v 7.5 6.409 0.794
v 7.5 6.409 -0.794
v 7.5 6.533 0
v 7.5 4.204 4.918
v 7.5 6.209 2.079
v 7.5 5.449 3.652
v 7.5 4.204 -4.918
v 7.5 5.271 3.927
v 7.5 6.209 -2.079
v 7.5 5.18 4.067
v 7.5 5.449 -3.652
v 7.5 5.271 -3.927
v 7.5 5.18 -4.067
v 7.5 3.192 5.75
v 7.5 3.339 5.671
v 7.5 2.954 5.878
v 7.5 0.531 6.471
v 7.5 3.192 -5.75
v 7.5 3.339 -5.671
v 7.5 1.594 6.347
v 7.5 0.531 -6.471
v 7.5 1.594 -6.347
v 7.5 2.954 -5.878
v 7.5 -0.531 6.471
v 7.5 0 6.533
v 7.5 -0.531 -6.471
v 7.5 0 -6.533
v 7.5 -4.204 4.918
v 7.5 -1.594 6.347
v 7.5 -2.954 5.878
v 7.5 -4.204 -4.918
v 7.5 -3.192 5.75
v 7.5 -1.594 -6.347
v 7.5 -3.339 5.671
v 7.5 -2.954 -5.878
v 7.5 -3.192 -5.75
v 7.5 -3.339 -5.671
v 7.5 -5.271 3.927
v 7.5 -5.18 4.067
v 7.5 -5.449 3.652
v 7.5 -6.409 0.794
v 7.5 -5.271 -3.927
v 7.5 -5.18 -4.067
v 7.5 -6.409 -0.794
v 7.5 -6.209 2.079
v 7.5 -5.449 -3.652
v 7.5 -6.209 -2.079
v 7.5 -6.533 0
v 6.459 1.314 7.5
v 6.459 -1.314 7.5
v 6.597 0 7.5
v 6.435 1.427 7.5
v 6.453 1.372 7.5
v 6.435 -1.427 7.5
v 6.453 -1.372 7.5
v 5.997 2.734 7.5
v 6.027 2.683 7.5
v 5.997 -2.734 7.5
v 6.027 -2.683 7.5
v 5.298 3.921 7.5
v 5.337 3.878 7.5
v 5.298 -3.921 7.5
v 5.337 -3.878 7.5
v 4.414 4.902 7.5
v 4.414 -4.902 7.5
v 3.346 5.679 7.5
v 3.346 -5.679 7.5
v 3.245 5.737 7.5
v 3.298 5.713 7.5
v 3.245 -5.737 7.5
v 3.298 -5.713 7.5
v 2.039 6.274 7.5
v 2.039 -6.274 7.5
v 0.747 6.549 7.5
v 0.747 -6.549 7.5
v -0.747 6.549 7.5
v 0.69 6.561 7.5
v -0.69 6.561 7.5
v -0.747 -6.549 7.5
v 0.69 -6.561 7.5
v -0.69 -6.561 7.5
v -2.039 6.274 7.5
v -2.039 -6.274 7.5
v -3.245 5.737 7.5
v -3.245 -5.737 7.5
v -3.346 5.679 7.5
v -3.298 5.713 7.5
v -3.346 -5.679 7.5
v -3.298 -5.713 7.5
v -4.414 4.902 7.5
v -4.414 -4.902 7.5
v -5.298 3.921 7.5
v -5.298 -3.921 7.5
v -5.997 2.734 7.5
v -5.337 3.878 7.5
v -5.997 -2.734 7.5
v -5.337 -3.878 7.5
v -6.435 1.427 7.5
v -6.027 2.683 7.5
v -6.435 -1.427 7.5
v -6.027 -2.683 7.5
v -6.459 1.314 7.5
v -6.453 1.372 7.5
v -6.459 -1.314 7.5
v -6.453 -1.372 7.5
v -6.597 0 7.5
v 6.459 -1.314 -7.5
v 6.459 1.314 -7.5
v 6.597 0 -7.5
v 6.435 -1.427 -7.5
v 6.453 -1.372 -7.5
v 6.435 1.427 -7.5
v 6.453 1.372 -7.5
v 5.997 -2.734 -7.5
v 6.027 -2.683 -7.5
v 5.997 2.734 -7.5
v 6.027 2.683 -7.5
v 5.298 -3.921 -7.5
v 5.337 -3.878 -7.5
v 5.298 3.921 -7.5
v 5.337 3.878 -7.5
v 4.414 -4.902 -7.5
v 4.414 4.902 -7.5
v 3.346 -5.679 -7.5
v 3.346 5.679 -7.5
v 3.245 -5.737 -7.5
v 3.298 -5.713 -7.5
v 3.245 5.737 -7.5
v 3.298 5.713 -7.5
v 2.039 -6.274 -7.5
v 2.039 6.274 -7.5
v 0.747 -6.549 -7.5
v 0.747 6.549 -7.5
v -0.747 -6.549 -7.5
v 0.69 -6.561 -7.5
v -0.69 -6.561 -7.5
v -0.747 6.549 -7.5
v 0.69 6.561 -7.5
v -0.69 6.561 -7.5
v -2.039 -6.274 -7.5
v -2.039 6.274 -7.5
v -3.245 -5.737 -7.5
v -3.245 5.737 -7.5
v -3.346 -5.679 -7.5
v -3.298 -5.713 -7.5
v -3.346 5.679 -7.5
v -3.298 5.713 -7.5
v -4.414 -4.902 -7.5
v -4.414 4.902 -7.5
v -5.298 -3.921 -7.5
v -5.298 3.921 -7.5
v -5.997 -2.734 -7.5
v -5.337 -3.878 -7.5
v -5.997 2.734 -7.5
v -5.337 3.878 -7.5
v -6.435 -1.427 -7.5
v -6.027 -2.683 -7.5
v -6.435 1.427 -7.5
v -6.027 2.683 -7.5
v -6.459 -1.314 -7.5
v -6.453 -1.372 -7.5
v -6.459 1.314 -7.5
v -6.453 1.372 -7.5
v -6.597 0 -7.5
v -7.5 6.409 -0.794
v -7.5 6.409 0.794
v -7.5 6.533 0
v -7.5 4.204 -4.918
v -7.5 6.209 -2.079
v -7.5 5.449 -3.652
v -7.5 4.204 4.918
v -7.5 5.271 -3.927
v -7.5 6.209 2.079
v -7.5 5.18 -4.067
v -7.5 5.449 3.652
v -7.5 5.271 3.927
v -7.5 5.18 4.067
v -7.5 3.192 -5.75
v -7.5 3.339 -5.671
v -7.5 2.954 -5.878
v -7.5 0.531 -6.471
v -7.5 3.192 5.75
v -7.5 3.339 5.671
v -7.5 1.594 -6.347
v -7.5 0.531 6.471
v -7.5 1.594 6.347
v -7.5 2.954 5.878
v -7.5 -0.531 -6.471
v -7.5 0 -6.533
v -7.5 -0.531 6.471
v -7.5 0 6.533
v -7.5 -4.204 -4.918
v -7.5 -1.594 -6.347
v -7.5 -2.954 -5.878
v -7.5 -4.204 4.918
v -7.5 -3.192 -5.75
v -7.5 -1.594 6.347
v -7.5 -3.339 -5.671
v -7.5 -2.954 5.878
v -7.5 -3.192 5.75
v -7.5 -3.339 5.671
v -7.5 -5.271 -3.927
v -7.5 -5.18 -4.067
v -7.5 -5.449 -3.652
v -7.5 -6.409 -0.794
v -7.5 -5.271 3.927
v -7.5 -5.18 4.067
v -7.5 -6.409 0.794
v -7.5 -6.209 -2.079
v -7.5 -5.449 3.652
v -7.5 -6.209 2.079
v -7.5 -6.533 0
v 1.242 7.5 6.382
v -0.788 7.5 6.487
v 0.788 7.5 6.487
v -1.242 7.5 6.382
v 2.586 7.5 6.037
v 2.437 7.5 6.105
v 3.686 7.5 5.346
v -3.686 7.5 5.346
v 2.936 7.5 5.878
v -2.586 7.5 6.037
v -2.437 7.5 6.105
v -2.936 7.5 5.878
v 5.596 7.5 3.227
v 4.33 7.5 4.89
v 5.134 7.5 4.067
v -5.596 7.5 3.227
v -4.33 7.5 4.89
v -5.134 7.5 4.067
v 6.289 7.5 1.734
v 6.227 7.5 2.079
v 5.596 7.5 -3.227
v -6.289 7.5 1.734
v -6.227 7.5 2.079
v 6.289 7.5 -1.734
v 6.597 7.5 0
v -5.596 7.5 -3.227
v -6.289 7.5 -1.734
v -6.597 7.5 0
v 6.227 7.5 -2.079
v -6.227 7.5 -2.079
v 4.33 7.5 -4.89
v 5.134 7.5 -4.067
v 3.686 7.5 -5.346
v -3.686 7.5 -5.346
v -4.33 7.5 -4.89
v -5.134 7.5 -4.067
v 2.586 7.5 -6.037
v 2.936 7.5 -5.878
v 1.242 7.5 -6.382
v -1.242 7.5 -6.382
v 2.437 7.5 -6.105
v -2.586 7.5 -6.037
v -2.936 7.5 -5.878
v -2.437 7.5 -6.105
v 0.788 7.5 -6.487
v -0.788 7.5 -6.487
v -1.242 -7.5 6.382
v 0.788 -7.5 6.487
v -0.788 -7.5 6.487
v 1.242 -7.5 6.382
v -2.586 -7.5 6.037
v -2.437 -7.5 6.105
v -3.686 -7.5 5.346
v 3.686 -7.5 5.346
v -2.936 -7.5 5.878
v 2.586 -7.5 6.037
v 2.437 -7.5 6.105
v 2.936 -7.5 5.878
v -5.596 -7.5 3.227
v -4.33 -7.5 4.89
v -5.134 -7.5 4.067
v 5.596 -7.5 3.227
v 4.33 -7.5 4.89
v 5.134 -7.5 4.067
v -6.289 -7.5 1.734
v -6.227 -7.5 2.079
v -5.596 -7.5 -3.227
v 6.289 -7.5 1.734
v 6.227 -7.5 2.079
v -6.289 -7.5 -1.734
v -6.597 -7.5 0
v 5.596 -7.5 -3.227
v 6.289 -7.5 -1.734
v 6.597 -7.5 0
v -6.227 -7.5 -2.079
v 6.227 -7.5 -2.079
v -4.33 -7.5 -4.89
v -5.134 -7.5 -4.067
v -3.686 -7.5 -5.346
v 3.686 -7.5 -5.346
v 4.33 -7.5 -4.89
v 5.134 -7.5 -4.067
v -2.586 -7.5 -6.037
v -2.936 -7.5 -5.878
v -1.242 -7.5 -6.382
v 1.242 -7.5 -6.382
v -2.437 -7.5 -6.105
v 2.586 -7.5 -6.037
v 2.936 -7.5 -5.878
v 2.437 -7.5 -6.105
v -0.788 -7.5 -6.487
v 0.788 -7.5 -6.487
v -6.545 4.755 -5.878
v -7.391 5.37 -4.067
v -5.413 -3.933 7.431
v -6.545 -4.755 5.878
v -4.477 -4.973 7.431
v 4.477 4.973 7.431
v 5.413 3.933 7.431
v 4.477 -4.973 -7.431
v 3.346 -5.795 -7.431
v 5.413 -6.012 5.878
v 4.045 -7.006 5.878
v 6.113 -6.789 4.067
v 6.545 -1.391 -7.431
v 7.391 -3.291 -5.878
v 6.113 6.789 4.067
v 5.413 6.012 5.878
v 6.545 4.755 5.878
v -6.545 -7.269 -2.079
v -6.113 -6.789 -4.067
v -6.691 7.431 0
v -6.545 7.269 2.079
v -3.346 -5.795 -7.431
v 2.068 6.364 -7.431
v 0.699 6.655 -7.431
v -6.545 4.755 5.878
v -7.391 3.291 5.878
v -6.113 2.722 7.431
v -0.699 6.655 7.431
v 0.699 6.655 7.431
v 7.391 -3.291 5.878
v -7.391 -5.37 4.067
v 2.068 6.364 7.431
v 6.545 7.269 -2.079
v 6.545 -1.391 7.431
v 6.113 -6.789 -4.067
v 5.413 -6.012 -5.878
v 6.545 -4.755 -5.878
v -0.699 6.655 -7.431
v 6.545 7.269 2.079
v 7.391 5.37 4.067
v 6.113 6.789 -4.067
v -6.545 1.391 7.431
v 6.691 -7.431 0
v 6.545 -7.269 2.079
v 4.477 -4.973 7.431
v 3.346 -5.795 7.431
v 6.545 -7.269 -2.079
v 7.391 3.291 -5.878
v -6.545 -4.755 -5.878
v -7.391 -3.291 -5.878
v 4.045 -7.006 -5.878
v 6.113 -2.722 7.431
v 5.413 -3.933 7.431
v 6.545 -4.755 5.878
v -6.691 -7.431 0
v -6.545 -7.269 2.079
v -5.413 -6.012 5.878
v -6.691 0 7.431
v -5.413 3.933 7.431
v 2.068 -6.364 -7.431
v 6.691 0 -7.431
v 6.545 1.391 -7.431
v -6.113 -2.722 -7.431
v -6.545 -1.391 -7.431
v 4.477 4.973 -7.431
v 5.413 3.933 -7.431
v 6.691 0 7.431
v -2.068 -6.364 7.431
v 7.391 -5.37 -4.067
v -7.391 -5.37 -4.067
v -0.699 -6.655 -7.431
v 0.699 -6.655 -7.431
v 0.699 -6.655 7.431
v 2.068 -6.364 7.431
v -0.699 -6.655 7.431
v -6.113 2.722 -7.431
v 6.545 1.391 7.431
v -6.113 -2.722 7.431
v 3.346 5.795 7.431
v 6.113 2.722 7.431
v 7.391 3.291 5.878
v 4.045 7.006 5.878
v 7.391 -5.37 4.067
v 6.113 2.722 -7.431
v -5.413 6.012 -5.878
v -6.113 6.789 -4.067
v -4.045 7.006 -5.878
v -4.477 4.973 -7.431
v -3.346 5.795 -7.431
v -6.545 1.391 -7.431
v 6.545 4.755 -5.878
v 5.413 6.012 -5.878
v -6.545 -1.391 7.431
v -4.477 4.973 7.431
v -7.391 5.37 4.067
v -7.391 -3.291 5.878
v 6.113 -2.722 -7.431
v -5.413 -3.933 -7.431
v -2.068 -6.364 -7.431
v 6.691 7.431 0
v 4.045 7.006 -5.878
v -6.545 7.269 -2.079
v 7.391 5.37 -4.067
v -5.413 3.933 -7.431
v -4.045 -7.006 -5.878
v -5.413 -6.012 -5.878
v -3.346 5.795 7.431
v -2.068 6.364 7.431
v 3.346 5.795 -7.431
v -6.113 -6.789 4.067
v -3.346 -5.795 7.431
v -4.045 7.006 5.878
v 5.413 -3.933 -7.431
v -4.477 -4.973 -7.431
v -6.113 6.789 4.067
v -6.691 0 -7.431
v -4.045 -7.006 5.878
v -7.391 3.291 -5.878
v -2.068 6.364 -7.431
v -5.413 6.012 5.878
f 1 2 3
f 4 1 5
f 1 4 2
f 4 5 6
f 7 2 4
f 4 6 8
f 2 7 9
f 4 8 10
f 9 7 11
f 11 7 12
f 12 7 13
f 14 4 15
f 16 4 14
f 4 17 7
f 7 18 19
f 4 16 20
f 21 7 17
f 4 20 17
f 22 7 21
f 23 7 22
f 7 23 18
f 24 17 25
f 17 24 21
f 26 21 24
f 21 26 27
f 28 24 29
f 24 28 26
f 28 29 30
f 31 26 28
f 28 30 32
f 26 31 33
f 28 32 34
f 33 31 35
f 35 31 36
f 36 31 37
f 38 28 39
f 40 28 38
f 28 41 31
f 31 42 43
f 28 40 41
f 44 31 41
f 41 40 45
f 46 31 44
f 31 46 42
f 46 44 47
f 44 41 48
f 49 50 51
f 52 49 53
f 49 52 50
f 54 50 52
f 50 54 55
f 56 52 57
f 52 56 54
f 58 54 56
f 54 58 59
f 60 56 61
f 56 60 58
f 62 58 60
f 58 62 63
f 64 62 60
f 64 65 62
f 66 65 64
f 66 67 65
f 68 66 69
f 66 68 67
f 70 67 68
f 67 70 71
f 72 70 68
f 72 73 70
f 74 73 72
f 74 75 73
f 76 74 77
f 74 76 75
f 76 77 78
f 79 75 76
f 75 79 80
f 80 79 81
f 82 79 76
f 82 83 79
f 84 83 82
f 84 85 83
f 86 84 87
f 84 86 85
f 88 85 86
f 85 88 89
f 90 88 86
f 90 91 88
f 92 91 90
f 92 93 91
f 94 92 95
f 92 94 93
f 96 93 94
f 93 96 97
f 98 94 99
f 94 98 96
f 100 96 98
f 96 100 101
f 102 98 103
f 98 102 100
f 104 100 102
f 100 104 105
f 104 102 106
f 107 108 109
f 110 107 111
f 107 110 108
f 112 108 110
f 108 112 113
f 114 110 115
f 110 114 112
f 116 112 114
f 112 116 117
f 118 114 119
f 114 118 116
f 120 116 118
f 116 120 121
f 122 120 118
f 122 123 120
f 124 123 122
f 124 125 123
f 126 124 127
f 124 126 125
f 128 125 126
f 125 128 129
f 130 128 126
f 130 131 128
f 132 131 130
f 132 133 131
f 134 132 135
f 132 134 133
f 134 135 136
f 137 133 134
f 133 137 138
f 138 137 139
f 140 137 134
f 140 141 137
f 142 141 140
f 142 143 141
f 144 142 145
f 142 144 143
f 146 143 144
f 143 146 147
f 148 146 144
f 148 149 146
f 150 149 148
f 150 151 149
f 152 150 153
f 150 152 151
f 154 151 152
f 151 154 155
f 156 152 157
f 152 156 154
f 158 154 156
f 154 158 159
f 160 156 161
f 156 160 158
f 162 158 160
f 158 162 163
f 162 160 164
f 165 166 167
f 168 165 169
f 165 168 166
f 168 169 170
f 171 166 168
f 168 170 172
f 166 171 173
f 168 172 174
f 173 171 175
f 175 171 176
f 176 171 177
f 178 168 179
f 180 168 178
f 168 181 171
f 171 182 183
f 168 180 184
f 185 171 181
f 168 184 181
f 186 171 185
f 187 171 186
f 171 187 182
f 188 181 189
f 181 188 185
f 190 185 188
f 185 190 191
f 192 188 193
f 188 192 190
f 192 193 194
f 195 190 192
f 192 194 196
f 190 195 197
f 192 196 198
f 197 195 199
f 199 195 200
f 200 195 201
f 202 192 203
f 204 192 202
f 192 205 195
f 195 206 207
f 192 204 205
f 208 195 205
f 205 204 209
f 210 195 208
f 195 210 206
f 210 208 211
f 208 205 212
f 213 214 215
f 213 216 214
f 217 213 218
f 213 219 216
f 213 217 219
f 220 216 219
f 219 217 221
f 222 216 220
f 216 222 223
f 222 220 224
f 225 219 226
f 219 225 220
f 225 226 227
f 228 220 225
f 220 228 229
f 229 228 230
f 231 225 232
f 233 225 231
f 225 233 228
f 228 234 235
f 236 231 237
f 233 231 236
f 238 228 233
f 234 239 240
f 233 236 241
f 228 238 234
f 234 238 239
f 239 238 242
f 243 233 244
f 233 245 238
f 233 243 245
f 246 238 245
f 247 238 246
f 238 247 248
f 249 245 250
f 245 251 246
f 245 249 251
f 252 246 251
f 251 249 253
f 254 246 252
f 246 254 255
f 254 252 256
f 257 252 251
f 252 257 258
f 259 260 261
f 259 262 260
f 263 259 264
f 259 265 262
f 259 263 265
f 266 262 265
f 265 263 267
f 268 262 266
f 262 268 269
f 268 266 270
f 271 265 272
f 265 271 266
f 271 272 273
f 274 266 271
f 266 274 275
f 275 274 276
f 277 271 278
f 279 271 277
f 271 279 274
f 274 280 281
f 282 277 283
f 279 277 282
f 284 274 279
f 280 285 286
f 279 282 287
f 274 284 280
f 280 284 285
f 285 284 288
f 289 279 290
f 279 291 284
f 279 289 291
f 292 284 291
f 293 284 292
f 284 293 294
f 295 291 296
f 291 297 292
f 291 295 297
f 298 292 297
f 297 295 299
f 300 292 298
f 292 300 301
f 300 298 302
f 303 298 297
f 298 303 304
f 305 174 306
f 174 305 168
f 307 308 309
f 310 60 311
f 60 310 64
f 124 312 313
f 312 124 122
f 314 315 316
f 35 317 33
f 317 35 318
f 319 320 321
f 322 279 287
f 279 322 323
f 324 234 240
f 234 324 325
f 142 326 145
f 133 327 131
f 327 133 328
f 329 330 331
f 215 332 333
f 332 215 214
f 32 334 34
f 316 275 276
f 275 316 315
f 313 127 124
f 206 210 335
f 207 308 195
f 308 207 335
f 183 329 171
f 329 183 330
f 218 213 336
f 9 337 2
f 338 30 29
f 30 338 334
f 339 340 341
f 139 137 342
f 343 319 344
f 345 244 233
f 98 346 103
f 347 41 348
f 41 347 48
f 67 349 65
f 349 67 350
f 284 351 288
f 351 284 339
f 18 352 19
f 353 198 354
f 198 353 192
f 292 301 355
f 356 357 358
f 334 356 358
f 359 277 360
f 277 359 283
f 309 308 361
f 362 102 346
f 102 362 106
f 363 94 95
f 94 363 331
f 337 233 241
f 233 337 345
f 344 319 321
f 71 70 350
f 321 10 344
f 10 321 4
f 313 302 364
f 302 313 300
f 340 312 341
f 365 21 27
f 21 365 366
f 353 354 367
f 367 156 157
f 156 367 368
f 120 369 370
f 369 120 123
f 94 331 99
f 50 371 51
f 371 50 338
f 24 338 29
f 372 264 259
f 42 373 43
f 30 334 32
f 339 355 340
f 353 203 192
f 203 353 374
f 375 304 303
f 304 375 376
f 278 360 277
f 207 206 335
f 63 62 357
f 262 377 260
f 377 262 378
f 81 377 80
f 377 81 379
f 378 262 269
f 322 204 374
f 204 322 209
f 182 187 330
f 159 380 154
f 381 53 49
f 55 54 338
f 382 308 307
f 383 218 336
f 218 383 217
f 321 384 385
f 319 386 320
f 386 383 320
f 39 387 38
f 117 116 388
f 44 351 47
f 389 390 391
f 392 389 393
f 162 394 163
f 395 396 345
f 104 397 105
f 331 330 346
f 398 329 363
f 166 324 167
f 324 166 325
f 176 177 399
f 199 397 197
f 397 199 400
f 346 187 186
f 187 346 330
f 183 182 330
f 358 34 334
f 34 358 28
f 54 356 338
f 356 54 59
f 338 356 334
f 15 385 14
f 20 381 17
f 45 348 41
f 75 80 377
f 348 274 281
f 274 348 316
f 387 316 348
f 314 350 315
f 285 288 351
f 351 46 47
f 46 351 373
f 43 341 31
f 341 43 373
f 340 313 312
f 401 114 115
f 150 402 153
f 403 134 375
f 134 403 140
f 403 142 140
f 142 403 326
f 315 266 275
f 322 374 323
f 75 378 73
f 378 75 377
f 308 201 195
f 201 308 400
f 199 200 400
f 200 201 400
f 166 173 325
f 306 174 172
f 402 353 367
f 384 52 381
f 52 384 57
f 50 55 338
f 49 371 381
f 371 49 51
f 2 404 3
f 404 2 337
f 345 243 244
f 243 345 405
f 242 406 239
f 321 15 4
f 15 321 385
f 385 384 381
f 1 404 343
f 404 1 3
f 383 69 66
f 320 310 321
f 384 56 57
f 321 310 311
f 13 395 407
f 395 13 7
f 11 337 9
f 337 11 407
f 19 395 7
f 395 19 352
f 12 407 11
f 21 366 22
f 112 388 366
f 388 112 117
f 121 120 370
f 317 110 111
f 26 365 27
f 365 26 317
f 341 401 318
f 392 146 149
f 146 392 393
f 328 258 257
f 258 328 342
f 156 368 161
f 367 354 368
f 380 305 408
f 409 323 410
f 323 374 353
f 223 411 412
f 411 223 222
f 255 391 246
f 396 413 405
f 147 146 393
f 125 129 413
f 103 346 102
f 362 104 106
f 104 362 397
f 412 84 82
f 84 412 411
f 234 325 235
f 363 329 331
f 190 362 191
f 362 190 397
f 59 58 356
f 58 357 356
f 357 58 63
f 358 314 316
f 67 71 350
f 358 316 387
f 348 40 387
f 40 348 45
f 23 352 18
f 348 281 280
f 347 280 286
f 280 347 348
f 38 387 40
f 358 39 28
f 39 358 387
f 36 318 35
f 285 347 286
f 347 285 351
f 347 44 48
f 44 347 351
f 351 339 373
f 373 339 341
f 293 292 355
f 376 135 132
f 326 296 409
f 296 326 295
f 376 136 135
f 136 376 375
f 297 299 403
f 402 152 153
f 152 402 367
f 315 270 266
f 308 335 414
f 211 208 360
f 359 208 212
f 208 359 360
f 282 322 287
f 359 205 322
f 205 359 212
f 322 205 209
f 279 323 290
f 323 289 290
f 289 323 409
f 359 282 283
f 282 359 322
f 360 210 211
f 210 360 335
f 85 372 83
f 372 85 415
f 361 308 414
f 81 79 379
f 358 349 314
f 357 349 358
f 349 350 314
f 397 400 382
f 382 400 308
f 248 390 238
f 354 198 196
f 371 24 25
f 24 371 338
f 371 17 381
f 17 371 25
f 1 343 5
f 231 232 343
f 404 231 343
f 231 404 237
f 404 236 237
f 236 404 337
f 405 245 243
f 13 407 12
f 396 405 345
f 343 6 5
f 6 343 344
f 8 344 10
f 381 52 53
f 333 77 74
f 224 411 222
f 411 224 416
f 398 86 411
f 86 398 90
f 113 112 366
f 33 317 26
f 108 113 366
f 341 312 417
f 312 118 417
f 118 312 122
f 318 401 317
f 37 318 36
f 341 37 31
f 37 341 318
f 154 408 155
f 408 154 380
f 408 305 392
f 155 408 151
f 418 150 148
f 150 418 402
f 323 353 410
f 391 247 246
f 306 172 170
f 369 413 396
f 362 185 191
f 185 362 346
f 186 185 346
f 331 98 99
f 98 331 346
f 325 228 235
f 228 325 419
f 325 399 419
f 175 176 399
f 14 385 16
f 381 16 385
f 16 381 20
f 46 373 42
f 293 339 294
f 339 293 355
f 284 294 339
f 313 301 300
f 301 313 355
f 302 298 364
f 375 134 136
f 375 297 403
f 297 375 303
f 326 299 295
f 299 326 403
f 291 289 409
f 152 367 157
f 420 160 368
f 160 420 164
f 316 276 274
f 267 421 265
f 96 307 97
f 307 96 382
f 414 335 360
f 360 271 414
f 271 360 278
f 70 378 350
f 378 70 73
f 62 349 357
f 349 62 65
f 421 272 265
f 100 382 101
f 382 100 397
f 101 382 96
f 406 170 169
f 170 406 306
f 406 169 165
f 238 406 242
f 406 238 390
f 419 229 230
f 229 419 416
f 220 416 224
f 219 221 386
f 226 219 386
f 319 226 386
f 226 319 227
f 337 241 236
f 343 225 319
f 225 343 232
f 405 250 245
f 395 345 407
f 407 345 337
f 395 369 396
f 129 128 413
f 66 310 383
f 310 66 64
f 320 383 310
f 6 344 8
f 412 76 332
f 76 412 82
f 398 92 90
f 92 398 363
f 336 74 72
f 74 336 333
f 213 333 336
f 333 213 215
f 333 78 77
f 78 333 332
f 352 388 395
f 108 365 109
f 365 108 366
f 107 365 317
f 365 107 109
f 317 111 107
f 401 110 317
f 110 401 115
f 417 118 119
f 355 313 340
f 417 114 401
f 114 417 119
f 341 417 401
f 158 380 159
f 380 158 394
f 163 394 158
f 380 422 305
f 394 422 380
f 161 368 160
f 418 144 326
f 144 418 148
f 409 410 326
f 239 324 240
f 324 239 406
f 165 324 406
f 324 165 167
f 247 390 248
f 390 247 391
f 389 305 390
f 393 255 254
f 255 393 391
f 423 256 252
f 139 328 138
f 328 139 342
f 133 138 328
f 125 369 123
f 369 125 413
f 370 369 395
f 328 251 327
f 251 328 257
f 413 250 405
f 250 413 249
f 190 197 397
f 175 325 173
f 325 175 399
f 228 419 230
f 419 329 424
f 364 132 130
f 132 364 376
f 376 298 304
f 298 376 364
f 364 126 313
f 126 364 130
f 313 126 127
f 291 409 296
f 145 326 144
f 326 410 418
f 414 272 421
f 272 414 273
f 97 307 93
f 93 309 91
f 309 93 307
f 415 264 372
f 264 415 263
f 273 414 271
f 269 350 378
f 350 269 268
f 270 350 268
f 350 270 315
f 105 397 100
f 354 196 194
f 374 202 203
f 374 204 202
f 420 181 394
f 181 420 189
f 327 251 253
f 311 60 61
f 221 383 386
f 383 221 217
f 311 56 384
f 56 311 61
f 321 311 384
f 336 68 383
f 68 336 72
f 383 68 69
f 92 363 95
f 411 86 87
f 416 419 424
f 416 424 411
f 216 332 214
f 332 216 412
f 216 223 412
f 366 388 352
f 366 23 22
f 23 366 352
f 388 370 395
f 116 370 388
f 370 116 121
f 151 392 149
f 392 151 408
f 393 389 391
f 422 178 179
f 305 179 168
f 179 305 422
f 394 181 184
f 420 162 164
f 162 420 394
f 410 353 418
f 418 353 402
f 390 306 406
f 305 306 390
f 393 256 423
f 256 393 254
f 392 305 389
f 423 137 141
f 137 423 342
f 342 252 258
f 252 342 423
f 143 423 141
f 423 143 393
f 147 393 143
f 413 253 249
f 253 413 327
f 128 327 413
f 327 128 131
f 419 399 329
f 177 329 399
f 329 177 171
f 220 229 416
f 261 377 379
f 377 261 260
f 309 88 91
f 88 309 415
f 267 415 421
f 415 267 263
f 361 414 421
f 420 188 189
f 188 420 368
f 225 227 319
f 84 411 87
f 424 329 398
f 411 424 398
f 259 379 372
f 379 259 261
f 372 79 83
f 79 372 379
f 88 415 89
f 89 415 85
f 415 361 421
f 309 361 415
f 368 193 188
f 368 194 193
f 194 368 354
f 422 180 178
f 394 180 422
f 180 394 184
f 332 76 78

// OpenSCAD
// CSG.scad - Basic example of CSG usage

intersection() {
    cube(15, center=true);
    sphere(10);
}

echo(version=version());
// Written by Marius Kintel <marius@kintel.net>
//
// To the extent possible under law, the author(s) have dedicated all
// copyright and related and neighboring rights to this software to the
// public domain worldwide. This software is distributed without any
// warranty.
//
// You should have received a copy of the CC0 Public Domain
// Dedication along with this software.
// If not, see <http://creativecommons.org/publicdomain/zero/1.0/>.
